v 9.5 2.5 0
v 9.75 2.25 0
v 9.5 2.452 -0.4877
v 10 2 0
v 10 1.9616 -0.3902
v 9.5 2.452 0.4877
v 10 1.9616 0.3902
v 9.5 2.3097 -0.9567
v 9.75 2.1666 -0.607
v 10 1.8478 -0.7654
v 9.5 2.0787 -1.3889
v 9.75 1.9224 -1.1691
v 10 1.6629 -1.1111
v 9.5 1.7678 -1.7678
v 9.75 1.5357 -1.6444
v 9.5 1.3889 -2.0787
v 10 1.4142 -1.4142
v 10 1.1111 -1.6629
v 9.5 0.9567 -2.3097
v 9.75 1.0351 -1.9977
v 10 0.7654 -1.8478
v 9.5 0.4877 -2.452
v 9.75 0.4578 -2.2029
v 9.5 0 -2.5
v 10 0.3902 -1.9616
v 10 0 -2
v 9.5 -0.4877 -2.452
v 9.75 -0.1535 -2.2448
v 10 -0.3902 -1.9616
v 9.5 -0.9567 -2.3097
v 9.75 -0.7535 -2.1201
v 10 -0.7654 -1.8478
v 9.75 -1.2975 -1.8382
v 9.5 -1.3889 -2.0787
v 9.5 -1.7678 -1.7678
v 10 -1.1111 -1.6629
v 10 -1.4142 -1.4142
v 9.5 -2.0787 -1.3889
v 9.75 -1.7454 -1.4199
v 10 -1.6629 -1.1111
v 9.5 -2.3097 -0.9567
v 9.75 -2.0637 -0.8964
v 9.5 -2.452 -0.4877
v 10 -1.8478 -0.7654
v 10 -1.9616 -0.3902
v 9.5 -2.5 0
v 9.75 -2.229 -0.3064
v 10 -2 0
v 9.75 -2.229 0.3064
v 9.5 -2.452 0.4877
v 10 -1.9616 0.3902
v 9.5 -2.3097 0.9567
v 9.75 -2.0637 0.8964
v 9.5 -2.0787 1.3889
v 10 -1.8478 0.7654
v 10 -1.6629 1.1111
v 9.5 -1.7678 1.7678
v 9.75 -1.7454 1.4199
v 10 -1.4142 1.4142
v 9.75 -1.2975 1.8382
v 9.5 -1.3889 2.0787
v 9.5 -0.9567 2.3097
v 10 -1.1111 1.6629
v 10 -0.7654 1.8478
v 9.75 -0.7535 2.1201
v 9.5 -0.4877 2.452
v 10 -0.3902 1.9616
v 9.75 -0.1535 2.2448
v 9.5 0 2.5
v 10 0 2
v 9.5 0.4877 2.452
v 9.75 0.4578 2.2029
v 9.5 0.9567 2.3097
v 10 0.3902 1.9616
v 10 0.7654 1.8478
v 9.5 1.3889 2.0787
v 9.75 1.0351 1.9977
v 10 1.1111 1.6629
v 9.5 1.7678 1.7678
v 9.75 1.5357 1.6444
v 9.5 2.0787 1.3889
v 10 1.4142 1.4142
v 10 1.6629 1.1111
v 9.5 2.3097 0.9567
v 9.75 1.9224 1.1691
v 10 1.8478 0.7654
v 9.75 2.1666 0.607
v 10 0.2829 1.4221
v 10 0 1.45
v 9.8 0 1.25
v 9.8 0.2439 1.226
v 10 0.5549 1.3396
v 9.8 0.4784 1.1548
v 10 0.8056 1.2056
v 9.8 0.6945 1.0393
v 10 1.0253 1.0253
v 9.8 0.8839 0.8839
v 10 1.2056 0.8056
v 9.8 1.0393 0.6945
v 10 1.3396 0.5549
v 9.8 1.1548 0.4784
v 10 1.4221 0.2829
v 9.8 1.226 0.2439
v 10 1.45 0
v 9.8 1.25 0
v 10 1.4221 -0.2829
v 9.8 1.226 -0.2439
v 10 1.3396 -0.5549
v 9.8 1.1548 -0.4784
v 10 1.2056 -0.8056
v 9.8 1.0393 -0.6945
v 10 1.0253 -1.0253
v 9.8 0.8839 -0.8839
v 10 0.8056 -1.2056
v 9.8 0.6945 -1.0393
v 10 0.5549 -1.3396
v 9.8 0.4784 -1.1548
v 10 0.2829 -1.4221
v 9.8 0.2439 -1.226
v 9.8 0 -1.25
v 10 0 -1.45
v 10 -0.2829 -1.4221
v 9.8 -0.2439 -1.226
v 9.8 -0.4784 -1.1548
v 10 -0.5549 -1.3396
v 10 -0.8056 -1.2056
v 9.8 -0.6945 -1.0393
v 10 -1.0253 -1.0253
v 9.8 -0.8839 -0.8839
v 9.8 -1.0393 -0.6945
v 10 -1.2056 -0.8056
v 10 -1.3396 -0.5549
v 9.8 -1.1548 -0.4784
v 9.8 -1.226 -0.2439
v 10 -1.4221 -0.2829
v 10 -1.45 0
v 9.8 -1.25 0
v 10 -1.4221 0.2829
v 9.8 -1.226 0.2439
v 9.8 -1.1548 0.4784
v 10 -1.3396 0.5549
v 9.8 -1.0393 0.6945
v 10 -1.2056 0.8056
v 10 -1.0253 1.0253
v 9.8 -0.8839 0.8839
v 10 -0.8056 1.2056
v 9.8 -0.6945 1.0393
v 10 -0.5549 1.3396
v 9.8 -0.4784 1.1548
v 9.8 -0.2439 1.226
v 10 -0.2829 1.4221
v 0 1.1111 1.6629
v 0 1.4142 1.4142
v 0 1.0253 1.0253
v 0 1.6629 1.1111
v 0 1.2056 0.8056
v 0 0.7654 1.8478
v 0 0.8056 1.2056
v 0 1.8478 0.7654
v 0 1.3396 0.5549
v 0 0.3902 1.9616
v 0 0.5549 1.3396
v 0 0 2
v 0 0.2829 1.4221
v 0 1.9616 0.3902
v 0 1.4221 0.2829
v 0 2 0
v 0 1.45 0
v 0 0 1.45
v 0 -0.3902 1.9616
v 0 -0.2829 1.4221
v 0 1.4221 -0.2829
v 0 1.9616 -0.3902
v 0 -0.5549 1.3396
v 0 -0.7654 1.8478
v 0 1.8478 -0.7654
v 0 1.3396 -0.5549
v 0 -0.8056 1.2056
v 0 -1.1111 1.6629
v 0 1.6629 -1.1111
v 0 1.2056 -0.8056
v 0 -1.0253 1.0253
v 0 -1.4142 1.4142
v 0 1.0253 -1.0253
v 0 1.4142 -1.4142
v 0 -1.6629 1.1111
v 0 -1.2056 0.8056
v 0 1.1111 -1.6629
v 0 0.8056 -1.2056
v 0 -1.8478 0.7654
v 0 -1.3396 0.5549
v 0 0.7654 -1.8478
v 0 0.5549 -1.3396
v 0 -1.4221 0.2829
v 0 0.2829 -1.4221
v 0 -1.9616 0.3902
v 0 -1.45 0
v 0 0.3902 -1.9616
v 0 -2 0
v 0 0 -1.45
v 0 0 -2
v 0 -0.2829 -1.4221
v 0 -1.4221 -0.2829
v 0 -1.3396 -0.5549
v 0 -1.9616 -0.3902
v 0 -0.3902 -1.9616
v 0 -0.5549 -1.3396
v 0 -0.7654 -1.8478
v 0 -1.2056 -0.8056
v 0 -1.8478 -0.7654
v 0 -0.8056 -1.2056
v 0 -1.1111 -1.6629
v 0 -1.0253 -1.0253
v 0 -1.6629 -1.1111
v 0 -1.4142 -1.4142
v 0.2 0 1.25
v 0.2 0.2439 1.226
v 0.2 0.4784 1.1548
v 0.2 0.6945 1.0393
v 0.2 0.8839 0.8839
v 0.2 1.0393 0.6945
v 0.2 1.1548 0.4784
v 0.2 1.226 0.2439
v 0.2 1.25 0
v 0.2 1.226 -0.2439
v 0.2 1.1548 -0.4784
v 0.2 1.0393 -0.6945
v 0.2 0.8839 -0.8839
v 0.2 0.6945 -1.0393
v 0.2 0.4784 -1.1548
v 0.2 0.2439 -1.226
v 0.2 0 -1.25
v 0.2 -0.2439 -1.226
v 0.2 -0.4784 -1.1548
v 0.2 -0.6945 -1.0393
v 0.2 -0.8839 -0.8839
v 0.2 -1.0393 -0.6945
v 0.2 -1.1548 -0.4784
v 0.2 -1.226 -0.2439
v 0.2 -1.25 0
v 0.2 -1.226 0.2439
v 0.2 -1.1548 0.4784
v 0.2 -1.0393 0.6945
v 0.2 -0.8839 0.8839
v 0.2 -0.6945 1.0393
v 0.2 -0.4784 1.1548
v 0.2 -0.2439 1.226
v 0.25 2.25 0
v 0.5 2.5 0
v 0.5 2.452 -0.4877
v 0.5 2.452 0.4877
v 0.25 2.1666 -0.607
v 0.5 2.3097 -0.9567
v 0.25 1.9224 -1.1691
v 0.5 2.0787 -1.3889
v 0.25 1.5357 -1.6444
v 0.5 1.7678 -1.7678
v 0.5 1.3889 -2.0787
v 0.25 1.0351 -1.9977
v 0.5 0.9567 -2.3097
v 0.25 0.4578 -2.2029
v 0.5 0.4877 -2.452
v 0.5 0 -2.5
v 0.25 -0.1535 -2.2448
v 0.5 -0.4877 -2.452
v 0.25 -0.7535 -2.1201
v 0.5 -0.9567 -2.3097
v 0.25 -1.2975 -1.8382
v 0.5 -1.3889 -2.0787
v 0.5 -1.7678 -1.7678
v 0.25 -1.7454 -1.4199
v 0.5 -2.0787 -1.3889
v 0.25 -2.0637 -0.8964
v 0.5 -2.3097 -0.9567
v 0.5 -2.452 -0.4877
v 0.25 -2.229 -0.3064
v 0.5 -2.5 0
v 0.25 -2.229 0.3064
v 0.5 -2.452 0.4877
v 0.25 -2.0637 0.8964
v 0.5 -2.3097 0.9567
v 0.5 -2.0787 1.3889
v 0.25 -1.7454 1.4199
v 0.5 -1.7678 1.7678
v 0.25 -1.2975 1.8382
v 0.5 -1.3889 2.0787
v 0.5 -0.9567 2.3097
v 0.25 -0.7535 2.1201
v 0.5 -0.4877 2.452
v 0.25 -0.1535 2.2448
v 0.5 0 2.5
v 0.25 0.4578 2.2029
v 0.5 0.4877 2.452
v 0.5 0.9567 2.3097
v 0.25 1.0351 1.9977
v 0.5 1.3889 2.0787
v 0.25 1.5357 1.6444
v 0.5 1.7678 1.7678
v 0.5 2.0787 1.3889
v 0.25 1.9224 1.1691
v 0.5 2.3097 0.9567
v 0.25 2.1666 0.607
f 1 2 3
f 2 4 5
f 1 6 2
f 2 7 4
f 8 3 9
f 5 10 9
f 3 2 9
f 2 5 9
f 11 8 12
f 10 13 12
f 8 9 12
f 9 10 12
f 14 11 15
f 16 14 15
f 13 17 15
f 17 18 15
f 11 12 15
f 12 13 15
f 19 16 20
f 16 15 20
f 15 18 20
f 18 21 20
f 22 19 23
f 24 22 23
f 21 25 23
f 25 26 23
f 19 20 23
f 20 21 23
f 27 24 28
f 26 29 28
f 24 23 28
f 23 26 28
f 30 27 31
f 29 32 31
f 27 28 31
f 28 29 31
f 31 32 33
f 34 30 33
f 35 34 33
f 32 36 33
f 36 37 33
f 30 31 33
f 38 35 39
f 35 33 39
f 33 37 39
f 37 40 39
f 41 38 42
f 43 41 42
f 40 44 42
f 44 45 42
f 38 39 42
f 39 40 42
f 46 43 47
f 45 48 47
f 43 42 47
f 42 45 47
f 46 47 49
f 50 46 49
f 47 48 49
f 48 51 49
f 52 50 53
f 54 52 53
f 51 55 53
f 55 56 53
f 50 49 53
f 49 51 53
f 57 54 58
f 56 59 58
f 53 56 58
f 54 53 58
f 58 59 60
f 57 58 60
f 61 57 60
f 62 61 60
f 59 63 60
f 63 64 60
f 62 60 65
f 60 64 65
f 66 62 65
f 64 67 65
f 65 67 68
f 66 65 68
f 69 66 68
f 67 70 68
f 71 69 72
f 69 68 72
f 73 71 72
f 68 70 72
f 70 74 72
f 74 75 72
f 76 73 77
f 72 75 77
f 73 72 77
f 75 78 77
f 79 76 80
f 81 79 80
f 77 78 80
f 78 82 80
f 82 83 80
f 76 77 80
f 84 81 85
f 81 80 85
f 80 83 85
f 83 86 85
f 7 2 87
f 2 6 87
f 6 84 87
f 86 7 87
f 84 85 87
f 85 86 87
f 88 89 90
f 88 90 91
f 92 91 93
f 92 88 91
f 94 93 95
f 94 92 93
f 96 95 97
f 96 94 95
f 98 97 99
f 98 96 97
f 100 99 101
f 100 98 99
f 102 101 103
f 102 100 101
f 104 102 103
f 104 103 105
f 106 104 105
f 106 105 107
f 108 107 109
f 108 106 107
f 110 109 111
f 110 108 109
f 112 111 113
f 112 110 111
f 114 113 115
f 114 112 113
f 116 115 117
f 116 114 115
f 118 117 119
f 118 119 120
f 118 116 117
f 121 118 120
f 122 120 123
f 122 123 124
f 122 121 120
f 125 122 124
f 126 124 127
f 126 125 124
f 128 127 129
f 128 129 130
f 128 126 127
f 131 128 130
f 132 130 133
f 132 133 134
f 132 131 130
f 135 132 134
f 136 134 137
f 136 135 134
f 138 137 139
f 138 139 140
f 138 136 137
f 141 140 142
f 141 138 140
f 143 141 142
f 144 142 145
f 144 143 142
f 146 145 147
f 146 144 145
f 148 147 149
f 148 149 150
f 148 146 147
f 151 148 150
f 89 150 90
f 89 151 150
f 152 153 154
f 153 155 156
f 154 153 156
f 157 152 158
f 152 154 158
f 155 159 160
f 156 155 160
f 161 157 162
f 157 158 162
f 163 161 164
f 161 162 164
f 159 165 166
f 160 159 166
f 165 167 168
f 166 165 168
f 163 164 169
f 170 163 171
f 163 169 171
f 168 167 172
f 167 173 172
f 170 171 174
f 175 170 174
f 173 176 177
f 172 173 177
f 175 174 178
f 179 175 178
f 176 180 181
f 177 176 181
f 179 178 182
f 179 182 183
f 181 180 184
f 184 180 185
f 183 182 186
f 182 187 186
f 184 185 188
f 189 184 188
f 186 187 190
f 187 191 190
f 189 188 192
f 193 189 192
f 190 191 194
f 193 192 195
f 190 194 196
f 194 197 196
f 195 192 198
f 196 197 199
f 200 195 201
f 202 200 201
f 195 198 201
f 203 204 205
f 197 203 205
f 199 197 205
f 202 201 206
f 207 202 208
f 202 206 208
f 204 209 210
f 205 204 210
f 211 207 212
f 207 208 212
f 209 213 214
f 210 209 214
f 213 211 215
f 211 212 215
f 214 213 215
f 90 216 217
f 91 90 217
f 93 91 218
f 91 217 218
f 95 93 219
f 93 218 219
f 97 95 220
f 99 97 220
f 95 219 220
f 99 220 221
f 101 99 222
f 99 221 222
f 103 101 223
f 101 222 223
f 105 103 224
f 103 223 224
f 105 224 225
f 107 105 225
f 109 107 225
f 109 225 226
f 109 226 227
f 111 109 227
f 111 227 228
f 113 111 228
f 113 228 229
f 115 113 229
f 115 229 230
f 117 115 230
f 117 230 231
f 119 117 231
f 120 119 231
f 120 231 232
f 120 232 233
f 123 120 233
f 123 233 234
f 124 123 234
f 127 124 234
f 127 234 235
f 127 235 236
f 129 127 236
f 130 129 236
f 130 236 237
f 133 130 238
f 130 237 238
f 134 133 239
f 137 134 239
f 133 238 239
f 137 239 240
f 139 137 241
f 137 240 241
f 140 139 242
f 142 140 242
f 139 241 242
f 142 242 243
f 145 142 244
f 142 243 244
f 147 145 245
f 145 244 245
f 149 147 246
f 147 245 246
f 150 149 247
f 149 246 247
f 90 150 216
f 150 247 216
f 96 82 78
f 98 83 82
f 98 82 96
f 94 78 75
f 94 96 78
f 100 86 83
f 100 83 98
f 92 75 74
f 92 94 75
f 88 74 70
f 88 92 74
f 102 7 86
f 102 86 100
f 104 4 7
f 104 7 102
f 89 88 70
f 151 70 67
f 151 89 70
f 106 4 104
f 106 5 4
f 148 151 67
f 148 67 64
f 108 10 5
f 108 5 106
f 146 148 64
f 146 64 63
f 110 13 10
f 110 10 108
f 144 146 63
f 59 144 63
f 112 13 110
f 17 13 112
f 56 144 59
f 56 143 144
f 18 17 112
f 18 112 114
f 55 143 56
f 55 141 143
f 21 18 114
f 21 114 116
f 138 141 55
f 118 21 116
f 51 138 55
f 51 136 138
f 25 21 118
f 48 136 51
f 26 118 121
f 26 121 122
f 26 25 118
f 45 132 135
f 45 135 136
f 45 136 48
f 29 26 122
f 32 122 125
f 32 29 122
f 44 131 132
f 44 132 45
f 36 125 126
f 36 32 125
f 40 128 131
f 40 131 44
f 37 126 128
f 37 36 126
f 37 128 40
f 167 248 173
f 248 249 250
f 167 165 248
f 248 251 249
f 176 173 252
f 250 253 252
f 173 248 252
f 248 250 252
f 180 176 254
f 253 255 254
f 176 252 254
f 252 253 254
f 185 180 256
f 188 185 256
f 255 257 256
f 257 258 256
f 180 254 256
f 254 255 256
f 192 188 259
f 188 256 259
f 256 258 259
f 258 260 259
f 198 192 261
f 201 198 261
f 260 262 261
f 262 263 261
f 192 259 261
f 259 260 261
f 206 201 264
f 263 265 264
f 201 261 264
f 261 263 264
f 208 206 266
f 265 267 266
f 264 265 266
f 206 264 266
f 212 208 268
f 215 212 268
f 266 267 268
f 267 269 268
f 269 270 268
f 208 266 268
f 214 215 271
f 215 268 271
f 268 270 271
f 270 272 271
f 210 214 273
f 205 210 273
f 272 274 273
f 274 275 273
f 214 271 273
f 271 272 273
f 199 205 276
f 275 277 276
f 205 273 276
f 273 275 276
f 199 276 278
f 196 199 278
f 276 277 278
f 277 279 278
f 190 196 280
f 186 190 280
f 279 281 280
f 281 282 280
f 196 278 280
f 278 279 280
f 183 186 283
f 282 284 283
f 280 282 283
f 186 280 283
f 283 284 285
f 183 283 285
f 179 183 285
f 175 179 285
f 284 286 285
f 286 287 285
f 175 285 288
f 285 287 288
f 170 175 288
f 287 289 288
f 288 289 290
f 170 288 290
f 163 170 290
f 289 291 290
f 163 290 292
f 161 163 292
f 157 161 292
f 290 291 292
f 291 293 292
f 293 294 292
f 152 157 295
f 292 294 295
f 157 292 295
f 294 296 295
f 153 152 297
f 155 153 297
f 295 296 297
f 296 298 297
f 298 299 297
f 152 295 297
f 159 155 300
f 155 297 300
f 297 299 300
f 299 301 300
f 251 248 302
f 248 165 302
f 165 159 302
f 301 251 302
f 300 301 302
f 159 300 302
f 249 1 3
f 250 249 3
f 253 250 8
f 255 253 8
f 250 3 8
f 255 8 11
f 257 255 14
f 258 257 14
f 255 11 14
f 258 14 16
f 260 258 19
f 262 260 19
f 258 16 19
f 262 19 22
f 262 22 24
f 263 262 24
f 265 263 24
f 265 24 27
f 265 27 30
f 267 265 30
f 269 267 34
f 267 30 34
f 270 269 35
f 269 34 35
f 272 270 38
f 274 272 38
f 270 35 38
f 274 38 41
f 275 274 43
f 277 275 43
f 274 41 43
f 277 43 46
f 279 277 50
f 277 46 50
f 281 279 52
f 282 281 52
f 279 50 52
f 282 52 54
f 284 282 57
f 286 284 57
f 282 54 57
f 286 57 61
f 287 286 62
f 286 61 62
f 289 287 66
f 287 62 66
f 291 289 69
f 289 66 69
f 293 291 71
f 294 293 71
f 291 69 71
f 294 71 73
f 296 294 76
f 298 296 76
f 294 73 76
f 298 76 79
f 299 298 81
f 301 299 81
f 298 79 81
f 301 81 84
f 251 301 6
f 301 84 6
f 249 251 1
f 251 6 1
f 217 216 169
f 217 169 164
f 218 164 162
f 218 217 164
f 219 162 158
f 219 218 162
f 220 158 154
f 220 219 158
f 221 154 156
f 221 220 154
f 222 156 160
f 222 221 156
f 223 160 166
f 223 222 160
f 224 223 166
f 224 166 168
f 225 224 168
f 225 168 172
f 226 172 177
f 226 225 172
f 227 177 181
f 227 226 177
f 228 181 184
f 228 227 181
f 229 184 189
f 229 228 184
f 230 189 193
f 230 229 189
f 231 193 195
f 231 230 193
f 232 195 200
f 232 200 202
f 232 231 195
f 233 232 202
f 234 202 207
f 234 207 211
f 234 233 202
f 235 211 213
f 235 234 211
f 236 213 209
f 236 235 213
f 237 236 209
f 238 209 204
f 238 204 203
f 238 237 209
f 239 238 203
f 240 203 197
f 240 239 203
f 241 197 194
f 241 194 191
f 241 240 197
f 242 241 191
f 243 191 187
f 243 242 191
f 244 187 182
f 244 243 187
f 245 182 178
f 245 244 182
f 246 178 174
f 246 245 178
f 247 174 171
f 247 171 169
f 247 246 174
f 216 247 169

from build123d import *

# Parameters (mm, degrees)
SKETCH_1_W        = 10
SKETCH_1_H        = 2.5
HOLE_WIZARD_M31_D = 2.5
CHAMFER_1_SIZE    = 0.2
CHAMFER_2_SIZE    = 0.5


with BuildPart() as part:
    # Эскиз1 → Повернуть1 (revolve)
    with BuildSketch(Plane.XY):
        with Locations((5, 1.25)):
            Rectangle(SKETCH_1_W, SKETCH_1_H)
    revolve(axis=Axis((10, 0, 0), (-1, 0, 0)))

    # Отверстие обработанное метчиком M31 (through all)
    with Locations(Plane(origin=(10, 0, 0), x_dir=(0, 0, -1), z_dir=(1, 0, 0))):
        with Locations((0, 0)):
            Hole(HOLE_WIZARD_M31_D / 2)

    # Фаска1
    chamfer_1_edges = [part.edges().sort_by_distance(p)[0] for p in [
        (10, 0, -1.25),
        (0, 0, -1.25),
    ]]
    chamfer(chamfer_1_edges, length=CHAMFER_1_SIZE)

    # Фаска2
    chamfer_2_edges = [part.edges().sort_by_distance(p)[0] for p in [
        (10, -2.5, 0),
        (0, -2.5, 0),
    ]]
    chamfer(chamfer_2_edges, length=CHAMFER_2_SIZE)


solid = part.part
